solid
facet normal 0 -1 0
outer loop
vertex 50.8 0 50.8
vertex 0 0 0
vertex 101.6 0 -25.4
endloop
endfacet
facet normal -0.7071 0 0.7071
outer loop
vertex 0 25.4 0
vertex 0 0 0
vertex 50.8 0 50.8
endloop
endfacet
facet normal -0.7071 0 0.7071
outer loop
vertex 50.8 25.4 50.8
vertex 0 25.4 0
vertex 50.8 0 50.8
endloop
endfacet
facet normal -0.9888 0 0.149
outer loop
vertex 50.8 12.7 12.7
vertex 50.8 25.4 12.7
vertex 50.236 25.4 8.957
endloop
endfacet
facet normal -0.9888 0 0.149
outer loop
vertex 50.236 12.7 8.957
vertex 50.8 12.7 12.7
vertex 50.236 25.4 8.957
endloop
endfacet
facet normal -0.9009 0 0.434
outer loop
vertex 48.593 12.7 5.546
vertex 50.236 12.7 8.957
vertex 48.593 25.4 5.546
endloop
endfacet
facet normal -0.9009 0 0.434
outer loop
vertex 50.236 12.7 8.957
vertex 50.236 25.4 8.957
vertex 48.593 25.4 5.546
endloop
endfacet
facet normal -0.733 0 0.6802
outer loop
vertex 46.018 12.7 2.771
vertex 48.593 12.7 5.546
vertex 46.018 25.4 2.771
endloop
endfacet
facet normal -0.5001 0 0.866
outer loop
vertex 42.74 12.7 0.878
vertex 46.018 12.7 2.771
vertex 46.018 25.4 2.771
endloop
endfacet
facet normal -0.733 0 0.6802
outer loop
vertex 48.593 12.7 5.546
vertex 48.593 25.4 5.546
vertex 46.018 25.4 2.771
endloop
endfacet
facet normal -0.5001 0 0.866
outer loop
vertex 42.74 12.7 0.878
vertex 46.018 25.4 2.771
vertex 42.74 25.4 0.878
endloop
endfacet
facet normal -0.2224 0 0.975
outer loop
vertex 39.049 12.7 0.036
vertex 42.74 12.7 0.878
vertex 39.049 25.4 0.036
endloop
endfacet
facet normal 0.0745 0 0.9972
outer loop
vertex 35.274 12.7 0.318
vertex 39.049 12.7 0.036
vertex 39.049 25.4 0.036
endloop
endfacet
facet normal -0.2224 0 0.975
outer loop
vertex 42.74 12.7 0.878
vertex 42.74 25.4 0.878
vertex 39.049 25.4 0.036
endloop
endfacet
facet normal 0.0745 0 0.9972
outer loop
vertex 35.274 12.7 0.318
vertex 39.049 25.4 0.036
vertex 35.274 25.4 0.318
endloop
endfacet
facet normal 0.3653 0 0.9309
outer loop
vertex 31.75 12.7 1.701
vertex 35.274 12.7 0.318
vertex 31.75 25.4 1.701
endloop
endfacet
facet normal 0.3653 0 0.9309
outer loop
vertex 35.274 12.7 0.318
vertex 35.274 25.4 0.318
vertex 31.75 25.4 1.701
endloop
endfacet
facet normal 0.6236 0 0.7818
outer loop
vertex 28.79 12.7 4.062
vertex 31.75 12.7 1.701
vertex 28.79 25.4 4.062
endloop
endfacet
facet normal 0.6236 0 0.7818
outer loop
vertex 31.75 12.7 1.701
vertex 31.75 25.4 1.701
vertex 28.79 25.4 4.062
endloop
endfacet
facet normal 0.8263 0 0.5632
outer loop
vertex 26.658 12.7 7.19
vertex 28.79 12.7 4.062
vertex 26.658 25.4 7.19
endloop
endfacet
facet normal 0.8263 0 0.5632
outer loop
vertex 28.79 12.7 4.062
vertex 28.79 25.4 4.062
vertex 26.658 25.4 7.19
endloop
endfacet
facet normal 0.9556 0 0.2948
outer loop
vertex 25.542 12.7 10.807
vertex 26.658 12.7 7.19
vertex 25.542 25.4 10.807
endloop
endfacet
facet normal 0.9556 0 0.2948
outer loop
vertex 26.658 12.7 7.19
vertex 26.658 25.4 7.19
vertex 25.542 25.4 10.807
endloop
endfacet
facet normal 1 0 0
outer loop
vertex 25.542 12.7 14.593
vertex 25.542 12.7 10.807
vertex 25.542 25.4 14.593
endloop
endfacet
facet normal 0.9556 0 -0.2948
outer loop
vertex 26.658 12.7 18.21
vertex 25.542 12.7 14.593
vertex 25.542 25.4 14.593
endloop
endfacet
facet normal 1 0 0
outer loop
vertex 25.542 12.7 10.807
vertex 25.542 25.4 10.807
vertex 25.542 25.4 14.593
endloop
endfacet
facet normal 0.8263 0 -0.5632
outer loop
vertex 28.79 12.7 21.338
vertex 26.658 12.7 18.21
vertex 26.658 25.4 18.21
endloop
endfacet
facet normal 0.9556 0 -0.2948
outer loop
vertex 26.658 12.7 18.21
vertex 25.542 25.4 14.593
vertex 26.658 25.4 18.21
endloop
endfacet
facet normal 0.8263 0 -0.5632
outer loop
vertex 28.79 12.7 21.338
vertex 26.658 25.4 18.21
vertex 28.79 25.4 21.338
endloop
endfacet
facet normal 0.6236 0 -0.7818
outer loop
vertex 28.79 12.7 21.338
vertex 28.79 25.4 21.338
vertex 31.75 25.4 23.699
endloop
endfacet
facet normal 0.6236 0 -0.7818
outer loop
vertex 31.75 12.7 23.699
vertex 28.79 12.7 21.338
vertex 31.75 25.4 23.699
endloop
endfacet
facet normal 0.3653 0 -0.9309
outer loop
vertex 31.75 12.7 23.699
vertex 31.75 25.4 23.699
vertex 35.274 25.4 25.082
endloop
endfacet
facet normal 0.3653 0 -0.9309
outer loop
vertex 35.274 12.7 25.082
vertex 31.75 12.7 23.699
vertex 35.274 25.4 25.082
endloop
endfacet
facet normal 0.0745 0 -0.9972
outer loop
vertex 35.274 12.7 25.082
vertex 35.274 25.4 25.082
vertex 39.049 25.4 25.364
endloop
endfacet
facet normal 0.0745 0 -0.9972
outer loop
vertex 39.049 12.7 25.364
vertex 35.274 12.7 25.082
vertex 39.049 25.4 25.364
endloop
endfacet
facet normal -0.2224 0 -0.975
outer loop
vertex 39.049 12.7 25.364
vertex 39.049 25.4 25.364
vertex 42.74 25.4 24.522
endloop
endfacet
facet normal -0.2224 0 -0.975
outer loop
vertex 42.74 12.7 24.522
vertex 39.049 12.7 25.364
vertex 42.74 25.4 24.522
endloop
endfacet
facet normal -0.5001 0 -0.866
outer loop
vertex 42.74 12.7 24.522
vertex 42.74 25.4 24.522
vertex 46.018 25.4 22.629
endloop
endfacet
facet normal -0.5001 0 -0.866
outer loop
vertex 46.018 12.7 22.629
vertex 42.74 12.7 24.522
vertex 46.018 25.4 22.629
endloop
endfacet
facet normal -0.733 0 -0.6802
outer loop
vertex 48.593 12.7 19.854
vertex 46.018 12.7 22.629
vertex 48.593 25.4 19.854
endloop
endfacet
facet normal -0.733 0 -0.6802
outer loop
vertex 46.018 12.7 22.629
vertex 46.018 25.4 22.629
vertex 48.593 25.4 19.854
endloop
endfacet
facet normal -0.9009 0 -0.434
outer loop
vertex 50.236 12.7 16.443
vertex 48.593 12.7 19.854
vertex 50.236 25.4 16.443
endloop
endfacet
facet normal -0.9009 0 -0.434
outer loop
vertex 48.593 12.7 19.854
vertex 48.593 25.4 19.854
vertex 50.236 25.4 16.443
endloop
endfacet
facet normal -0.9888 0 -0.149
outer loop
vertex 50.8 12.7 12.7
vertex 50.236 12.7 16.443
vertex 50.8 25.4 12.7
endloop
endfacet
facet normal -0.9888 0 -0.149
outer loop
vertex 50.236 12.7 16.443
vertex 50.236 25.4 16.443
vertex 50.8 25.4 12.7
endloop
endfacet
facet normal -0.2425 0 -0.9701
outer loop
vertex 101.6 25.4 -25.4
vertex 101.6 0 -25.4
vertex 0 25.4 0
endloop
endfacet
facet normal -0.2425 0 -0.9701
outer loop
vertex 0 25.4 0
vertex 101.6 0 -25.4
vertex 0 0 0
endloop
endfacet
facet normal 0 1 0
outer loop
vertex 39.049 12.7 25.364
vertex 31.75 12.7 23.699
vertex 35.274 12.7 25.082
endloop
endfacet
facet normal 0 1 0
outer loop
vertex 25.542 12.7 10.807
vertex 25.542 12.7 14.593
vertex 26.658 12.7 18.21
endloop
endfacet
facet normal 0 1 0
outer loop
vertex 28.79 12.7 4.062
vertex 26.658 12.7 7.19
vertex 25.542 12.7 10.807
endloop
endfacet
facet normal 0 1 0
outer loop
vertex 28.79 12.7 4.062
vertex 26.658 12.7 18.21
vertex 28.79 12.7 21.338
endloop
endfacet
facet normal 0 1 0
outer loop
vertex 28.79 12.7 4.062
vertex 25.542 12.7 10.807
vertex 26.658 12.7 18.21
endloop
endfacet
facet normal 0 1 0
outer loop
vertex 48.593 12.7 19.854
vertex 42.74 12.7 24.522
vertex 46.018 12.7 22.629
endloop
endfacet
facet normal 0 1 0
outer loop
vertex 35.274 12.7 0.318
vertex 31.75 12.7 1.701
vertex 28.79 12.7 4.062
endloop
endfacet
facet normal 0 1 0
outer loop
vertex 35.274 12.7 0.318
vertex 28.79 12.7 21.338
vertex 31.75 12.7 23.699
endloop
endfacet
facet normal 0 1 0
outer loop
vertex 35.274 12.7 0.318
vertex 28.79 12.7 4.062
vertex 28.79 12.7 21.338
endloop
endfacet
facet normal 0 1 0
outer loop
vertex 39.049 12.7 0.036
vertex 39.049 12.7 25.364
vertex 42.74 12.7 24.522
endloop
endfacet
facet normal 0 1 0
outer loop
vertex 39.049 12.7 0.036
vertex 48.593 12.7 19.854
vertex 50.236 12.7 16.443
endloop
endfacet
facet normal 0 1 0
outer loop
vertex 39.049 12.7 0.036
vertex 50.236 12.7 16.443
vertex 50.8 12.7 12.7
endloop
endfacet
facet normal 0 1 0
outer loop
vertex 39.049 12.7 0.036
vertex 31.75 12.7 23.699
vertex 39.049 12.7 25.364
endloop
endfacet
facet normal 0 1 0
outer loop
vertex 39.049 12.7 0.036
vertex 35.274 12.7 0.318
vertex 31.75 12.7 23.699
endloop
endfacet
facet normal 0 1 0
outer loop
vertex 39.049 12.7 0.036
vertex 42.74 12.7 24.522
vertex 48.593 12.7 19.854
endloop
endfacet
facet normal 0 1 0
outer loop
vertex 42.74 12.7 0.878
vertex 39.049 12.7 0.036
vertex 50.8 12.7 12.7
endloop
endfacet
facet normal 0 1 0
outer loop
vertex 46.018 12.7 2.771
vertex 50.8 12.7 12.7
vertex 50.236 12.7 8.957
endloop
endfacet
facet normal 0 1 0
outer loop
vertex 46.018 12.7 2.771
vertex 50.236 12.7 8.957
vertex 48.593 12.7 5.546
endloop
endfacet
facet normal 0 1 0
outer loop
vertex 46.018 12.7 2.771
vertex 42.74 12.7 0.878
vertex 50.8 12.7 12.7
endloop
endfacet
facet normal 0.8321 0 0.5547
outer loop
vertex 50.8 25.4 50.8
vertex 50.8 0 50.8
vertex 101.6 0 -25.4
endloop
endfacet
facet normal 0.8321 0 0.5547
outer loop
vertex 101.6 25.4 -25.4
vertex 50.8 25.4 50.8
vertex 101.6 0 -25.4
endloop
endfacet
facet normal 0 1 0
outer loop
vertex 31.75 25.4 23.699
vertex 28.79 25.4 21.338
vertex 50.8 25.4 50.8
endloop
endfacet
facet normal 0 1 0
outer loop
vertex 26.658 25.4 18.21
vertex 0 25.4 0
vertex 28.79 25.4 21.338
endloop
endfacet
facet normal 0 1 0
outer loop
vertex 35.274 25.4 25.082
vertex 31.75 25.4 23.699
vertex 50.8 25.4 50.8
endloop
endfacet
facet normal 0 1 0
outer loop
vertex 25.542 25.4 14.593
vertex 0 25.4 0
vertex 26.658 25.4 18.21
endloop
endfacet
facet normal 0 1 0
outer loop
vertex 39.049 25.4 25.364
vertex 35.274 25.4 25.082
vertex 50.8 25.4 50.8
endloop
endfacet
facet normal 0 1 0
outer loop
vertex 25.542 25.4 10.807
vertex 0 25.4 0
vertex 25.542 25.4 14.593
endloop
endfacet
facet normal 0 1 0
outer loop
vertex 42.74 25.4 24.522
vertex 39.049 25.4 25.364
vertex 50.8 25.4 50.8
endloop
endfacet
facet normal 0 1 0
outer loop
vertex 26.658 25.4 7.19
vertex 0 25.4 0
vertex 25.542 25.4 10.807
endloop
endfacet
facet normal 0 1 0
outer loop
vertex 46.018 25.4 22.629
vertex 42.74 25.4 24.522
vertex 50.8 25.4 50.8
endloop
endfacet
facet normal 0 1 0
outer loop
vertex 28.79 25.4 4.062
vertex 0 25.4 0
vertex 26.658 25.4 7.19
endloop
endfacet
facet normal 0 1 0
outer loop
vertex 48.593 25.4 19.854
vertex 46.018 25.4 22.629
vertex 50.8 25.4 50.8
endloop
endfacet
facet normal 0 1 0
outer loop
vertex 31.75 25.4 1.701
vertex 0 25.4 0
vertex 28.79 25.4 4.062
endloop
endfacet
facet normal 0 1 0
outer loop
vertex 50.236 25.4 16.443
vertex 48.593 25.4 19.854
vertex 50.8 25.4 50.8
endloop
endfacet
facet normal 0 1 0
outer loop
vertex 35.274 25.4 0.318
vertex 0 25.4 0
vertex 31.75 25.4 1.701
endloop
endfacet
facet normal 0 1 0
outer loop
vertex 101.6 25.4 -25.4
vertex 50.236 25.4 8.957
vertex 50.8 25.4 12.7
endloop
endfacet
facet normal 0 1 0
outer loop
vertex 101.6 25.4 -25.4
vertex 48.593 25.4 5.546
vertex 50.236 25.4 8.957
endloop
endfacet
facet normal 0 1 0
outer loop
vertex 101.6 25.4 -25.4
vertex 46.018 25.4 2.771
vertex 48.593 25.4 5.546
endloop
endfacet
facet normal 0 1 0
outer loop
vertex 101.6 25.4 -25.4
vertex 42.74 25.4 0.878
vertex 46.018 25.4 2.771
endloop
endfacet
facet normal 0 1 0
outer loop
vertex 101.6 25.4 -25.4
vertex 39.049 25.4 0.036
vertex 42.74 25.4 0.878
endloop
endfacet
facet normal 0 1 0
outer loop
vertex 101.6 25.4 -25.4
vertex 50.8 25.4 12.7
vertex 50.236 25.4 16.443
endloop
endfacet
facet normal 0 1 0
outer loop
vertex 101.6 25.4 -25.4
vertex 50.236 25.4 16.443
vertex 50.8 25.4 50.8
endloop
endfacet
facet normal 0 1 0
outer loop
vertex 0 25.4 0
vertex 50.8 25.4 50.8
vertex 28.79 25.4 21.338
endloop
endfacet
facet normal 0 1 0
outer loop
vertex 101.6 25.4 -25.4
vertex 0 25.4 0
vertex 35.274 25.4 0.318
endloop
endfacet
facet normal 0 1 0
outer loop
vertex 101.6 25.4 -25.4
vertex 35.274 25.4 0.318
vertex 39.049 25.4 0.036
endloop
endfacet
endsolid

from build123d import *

# Parameters (mm, degrees)
BOSS_EXTRUDE1_DEPTH = 25.4
SKETCH2_R           = 12.7
CUT_EXTRUDE1_DEPTH  = 12.7


with BuildPart() as part:
    # Sketch1 → Boss-Extrude1 (new body)
    with BuildSketch(Plane(origin=(0, 0, 0), x_dir=(1, 0, 0), z_dir=(0, 1, 0))):
        Polygon((0, 0), (50.8, -50.8), (101.6, 25.4), align=None)
    extrude(amount=BOSS_EXTRUDE1_DEPTH)

    # Sketch2 → Cut-Extrude1 (cut)
    with BuildSketch(Plane(origin=(0, 25.4, 0), x_dir=(1, 0, 0), z_dir=(0, 1, 0))):
        with Locations((38.1, -12.7)):
            Circle(SKETCH2_R)
    extrude(amount=-CUT_EXTRUDE1_DEPTH, mode=Mode.SUBTRACT)


solid = part.part
